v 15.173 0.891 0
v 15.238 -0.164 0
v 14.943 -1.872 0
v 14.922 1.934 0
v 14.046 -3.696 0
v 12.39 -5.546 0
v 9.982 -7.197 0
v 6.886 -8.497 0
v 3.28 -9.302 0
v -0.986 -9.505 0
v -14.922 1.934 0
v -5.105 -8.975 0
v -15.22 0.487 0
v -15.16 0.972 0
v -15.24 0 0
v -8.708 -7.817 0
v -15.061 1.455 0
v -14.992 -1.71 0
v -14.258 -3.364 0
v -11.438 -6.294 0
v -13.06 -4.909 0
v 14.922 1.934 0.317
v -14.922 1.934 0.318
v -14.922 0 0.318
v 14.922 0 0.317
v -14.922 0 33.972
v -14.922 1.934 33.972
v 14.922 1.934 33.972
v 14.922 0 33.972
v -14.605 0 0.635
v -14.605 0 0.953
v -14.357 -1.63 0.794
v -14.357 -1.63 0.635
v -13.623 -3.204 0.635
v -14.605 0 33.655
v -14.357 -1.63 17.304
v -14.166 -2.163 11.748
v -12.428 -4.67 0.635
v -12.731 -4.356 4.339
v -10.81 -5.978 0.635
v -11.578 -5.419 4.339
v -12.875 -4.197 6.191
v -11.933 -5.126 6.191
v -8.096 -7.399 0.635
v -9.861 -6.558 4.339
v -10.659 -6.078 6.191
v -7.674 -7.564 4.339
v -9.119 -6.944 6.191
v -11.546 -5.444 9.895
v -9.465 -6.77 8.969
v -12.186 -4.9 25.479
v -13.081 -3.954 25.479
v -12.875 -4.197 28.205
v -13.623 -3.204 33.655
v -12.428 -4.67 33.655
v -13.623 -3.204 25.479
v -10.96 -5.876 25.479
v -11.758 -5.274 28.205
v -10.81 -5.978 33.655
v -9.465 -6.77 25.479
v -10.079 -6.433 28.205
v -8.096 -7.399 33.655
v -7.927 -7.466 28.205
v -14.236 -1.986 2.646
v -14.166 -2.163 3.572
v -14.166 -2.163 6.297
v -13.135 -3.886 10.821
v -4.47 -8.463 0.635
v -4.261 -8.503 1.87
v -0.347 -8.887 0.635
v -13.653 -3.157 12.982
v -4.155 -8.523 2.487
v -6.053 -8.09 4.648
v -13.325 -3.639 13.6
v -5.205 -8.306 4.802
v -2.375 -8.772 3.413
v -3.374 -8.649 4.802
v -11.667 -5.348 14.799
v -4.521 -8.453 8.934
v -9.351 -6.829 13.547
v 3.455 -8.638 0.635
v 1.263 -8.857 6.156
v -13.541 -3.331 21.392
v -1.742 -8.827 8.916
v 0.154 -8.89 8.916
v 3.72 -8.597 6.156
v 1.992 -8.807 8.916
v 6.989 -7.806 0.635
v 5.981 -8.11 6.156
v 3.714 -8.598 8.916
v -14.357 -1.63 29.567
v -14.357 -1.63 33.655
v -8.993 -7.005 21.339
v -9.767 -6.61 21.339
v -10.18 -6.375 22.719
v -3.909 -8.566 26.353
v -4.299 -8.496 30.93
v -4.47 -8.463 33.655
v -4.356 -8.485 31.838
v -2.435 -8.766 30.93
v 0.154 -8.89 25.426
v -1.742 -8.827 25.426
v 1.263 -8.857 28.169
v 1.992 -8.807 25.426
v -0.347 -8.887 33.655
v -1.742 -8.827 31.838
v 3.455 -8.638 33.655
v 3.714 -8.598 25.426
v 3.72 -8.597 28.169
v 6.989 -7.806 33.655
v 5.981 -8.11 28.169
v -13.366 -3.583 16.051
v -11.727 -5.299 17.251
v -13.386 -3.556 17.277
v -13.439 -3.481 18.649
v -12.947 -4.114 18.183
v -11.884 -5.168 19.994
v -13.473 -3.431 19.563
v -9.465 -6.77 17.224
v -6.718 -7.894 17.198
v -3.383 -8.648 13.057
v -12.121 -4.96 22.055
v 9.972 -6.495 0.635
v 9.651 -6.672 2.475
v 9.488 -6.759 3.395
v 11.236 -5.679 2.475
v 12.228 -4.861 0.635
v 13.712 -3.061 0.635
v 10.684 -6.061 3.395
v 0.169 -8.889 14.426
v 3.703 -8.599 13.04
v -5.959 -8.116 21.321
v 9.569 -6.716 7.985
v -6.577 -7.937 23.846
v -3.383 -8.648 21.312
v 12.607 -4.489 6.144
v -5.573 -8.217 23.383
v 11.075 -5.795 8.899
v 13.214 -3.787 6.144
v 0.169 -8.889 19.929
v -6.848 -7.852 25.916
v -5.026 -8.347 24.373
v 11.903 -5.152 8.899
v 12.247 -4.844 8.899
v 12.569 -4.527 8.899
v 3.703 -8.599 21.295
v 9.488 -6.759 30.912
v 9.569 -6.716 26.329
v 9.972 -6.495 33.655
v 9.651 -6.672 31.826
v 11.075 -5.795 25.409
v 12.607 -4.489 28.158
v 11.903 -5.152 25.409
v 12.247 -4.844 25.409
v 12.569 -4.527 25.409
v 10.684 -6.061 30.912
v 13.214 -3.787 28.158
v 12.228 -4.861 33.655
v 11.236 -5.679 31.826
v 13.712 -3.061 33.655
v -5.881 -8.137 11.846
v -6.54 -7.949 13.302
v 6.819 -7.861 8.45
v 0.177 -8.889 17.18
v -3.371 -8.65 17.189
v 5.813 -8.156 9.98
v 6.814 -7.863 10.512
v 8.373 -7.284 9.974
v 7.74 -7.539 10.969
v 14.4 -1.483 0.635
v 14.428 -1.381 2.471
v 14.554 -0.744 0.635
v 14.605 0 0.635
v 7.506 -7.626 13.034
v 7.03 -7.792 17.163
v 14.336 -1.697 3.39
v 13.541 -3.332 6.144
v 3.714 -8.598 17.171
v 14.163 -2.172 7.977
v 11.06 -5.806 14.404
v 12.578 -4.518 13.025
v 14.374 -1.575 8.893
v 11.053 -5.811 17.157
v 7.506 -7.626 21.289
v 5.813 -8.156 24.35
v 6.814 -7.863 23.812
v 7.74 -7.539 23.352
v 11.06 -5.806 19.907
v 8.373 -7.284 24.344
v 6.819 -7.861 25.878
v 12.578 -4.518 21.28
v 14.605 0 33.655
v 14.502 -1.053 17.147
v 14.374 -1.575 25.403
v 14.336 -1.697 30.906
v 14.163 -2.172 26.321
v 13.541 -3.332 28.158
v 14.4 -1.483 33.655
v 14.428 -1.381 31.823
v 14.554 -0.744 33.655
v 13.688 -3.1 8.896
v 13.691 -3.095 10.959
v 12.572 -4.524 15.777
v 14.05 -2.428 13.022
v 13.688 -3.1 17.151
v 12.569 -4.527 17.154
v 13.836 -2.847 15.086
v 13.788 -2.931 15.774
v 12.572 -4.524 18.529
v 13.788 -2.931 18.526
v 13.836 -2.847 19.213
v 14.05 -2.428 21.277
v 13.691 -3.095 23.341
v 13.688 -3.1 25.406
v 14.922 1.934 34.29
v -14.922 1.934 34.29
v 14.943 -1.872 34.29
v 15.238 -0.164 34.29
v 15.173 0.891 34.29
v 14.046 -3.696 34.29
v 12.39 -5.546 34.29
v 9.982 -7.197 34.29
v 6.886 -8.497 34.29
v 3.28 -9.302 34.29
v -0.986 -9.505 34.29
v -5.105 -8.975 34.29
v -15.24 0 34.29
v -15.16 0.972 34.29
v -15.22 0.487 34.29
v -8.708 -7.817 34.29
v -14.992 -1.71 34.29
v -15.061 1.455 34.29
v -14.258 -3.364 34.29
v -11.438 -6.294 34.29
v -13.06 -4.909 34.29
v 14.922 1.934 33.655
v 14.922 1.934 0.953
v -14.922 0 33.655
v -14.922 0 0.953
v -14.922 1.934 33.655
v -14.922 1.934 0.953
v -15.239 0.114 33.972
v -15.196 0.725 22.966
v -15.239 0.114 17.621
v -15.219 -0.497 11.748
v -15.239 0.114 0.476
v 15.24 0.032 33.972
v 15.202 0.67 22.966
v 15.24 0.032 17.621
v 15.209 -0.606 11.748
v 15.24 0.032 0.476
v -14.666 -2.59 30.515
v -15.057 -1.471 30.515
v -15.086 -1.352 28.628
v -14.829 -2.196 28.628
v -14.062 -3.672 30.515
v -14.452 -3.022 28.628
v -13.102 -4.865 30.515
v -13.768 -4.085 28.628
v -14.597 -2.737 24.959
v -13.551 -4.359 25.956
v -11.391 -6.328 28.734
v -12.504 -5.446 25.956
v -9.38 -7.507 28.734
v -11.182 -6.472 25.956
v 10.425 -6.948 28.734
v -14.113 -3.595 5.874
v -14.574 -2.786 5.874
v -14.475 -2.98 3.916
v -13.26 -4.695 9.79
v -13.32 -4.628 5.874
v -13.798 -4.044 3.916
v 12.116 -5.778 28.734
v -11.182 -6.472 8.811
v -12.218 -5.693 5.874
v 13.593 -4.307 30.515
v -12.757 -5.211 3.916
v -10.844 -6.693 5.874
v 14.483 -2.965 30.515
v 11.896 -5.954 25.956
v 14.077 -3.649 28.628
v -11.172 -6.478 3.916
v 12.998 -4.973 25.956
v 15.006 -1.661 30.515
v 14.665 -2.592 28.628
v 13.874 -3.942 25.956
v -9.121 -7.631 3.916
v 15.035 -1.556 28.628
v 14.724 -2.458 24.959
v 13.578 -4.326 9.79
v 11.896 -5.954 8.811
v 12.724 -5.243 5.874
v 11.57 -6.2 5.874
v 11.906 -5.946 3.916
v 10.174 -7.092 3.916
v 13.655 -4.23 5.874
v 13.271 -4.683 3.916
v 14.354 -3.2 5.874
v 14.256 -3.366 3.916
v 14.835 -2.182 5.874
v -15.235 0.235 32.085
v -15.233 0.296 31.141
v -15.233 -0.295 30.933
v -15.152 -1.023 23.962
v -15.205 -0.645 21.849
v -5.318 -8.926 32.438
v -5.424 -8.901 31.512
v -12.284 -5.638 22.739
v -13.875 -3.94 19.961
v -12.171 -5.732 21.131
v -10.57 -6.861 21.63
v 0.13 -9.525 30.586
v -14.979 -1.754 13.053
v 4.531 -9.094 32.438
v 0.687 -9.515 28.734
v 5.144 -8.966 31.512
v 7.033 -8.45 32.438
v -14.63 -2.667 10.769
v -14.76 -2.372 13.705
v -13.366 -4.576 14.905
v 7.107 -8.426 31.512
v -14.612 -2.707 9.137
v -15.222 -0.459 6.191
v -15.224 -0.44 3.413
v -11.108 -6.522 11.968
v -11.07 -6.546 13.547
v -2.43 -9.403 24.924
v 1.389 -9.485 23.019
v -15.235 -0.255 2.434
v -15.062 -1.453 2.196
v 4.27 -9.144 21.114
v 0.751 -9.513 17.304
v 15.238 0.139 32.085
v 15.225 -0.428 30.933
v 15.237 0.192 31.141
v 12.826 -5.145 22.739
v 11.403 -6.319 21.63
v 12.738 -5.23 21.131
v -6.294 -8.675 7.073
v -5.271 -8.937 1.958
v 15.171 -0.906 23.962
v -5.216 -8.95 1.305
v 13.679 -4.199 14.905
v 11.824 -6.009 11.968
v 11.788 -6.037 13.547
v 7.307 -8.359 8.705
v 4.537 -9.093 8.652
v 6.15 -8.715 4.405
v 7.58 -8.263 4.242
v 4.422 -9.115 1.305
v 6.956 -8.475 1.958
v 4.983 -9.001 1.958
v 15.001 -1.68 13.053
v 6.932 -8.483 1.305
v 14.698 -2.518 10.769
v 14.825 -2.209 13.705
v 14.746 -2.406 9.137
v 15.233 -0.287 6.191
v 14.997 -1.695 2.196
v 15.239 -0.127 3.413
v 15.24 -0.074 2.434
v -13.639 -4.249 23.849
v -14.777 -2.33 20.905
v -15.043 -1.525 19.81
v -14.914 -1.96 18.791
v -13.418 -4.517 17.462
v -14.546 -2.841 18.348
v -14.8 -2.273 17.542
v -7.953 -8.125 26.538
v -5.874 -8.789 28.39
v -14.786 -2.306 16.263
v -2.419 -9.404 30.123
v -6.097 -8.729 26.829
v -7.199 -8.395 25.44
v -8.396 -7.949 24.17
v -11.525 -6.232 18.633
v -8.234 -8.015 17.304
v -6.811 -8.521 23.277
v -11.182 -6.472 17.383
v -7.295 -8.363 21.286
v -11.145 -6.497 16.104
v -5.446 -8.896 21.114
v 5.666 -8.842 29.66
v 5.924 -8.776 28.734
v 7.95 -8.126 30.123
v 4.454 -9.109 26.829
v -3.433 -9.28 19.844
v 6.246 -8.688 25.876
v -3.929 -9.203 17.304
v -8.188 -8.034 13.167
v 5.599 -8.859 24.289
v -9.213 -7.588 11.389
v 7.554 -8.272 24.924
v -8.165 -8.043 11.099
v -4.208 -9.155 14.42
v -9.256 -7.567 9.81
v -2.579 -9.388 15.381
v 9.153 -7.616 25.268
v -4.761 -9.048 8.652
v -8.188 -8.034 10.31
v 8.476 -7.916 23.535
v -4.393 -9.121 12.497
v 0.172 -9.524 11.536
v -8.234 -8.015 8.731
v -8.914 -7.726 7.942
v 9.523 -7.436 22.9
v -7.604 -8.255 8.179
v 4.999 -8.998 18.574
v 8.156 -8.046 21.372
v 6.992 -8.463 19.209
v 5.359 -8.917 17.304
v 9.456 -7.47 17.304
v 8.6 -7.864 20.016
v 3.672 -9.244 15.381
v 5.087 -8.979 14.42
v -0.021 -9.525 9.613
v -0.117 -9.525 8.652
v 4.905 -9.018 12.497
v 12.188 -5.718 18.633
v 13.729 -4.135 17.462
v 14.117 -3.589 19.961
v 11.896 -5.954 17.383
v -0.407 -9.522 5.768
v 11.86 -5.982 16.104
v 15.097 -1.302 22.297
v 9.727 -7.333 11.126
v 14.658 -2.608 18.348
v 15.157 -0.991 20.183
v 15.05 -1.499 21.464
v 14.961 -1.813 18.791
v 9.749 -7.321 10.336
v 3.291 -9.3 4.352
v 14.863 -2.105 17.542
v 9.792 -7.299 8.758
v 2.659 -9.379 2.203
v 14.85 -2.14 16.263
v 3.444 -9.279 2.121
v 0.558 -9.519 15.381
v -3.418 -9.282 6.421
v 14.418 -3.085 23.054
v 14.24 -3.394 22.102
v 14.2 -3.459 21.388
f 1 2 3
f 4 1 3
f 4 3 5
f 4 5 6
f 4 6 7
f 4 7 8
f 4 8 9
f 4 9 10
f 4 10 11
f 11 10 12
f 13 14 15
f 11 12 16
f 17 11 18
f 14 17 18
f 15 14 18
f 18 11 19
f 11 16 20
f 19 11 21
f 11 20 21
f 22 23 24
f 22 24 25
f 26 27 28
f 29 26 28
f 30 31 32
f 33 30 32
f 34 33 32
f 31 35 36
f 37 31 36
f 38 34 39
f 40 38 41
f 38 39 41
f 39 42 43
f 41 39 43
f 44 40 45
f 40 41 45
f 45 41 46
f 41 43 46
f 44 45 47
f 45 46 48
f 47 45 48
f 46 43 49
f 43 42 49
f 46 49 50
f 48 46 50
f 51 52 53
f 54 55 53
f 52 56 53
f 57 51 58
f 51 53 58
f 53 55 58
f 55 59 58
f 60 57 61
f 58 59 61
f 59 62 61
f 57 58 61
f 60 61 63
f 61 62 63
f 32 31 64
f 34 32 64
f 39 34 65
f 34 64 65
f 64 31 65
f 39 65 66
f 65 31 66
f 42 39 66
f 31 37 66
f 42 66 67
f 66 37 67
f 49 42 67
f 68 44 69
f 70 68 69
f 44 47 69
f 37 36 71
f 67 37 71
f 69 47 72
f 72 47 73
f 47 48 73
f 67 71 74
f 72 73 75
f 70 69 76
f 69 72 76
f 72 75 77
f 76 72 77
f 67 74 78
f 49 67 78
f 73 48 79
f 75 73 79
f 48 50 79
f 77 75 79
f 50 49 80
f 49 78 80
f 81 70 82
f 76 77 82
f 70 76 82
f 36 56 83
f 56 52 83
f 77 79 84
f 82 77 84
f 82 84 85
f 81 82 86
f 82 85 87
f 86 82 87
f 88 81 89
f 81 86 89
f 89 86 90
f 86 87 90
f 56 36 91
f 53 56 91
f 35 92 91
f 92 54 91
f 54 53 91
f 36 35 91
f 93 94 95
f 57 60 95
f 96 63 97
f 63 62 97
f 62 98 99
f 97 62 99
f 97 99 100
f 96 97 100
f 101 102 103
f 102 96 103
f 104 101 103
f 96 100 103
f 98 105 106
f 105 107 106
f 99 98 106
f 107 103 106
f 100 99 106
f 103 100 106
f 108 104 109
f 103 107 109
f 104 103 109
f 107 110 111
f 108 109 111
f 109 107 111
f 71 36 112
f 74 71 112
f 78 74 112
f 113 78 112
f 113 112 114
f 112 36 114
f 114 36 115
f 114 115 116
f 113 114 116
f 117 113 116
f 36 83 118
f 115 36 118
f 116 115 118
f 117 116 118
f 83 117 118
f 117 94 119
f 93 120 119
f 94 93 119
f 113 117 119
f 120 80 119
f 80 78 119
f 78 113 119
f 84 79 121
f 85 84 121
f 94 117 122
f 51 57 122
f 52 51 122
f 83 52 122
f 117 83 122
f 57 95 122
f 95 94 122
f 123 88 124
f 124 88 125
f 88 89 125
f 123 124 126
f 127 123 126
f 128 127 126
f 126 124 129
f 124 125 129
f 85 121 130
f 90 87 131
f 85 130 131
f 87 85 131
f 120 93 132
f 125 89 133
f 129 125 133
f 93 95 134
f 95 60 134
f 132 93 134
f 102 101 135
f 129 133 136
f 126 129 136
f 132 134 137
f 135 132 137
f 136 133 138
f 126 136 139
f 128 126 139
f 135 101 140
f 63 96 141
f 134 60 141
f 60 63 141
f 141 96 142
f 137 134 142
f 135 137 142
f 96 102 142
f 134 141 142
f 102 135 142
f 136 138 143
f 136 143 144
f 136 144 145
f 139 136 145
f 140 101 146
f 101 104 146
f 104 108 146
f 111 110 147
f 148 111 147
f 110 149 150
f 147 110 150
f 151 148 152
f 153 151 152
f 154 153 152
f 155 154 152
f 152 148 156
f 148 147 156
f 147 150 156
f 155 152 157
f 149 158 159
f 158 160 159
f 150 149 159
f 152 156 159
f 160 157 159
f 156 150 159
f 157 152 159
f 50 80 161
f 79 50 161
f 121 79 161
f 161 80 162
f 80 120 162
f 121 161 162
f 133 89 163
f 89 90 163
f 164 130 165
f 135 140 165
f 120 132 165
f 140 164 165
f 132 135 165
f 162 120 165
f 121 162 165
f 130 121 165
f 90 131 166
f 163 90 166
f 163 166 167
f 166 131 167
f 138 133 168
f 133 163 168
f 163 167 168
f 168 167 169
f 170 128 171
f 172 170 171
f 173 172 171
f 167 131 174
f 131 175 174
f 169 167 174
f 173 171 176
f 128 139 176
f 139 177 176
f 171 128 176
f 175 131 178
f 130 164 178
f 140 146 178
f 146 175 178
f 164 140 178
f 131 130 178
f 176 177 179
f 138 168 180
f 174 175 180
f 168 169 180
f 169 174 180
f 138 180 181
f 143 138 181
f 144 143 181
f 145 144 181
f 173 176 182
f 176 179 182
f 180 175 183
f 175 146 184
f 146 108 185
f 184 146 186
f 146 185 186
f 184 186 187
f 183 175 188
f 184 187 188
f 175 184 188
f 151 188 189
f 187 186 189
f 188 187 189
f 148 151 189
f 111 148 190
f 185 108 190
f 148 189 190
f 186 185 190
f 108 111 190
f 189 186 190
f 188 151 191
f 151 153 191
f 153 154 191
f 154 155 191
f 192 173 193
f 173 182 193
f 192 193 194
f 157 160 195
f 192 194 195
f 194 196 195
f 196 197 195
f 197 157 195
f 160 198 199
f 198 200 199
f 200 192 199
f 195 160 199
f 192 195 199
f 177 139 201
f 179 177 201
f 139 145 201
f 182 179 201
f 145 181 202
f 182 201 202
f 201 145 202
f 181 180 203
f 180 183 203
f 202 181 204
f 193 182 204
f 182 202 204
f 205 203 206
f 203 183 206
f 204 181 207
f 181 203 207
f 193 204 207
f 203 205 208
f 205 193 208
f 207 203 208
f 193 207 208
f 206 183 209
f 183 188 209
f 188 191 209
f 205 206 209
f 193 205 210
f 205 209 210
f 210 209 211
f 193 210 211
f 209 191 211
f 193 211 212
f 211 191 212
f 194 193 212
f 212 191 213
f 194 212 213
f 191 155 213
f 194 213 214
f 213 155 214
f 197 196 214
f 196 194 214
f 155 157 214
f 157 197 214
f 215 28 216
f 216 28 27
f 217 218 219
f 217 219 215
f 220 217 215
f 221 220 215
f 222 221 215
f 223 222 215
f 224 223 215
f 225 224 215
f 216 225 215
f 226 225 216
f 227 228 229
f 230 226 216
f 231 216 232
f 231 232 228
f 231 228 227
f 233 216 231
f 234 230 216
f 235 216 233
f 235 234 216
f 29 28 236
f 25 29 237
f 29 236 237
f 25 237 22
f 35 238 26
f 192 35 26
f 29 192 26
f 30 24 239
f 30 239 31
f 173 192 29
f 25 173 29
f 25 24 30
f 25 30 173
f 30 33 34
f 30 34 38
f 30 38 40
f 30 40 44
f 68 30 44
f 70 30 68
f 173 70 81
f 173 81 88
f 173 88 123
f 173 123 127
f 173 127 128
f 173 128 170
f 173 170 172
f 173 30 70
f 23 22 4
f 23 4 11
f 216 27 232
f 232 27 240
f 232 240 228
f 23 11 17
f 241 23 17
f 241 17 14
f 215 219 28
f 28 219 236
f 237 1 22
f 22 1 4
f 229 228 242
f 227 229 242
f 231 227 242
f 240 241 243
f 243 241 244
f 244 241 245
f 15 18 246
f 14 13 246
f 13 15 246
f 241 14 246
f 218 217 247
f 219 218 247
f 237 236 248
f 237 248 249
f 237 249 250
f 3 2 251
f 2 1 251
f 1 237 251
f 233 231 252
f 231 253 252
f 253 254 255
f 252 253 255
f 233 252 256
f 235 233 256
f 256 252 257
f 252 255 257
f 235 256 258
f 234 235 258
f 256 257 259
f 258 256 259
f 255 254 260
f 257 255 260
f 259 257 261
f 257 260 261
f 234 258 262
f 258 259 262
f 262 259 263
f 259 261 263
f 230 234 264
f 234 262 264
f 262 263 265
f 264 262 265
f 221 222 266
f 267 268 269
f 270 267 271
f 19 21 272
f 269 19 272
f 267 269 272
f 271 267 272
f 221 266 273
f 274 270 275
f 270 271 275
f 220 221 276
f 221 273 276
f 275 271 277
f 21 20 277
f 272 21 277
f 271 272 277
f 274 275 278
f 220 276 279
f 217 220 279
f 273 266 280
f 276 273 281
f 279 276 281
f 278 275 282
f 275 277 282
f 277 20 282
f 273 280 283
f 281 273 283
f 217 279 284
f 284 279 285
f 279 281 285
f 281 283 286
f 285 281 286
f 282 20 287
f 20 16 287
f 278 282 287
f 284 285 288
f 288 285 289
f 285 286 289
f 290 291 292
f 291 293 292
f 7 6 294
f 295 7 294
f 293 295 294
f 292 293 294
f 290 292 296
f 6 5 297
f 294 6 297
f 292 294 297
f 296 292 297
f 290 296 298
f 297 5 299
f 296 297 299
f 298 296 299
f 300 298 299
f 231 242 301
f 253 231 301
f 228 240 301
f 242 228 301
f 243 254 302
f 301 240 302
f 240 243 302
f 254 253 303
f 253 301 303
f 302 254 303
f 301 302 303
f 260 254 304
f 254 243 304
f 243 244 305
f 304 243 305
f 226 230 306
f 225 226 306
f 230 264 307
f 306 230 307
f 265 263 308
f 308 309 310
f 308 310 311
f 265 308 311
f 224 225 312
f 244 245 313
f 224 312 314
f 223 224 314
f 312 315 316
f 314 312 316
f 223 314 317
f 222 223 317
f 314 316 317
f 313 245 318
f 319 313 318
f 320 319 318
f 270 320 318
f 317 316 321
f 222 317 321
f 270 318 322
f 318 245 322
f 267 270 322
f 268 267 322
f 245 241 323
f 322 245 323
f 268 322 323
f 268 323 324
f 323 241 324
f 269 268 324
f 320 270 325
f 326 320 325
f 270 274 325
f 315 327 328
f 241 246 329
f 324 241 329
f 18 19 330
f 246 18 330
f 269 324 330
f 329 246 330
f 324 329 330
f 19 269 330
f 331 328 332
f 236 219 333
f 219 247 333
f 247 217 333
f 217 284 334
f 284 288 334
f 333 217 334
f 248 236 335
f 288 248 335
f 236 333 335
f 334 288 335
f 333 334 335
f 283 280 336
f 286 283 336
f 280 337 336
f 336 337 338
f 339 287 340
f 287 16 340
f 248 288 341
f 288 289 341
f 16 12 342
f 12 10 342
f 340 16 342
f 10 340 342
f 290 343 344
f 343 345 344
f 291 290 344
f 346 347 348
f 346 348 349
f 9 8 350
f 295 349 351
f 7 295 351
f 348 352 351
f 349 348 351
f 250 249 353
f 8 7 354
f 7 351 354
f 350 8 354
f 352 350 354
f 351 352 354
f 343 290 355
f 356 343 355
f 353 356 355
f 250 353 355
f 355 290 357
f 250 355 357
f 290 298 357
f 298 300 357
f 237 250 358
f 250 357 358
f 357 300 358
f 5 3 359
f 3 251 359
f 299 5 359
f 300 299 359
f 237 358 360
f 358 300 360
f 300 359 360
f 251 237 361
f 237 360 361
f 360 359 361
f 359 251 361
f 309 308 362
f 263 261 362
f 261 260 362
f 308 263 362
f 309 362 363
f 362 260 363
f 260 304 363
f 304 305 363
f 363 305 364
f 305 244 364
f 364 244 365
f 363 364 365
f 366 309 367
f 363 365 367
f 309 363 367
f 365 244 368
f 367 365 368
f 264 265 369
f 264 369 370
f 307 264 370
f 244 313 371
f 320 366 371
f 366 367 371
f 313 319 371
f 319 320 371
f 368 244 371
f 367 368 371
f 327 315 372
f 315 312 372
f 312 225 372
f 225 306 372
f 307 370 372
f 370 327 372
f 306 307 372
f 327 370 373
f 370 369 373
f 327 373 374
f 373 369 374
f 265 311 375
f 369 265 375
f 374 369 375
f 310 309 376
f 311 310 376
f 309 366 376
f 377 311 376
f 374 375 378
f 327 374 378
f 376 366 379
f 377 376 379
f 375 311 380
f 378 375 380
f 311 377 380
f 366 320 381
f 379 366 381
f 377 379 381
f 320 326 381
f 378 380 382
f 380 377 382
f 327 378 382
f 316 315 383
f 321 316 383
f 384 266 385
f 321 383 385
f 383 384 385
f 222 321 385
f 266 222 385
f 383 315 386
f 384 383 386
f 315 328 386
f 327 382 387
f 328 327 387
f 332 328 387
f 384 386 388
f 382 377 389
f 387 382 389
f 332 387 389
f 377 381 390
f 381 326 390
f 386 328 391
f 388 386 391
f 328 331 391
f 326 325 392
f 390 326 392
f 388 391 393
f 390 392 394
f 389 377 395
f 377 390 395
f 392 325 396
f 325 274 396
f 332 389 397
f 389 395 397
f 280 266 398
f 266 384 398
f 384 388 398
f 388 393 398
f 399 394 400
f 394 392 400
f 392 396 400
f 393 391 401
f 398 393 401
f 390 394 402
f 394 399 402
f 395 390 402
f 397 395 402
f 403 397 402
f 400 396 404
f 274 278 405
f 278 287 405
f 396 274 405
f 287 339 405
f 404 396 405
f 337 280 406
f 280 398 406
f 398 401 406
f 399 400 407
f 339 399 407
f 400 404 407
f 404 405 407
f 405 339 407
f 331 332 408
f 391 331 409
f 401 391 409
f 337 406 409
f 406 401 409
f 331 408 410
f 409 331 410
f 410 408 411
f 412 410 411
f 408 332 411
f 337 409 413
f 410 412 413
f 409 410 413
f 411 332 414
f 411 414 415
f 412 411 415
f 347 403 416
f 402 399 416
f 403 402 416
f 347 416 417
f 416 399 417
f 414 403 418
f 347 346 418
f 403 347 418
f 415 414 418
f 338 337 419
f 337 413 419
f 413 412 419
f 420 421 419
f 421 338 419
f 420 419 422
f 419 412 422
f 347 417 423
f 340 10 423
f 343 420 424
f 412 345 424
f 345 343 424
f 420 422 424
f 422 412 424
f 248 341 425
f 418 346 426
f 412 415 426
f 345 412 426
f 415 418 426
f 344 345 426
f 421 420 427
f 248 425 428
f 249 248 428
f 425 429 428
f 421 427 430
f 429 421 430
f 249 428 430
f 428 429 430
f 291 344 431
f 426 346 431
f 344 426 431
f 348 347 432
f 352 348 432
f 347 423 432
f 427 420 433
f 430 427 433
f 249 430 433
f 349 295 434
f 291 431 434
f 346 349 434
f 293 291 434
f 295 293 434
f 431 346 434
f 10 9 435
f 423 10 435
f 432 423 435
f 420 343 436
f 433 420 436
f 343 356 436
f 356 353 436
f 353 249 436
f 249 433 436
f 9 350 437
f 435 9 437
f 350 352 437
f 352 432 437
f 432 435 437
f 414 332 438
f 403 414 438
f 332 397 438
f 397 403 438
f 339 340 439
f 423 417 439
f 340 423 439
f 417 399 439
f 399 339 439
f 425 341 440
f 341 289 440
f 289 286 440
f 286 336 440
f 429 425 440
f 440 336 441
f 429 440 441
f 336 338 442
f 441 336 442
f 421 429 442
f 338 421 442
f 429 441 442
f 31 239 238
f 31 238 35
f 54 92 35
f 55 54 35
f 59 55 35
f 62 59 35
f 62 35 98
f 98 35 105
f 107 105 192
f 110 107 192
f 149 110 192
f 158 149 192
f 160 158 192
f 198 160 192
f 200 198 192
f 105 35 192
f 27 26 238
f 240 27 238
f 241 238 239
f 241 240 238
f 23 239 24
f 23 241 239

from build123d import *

# Parameters (mm, degrees)
SKETCH1_RX              = 15.24
SKETCH1_RY              = 9.525
BOSS_EXTRUDE2_DEPTH     = 34.29
CUT_EXTRUDE1_START      = -0.635
SKETCH3_RX              = 14.605
SKETCH3_RY              = 8.89
CUT_EXTRUDE1_DEPTH      = 33.02
CUT_EXTRUDE3_START      = -0.635
CUT_EXTRUDE3_DEPTH      = 32.7025
SKETCH6_W               = 32.06646649
SKETCH6_H               = 9.119465297
CUT_EXTRUDE4_DEPTH      = 40.3225
CUT_EXTRUDE4_DEPTH_BACK = 32.7025
SKETCH7_W               = 29.517013218
SKETCH7_H               = 33.655
CUT_EXTRUDE5_DEPTH      = 1.93413
SKETCH8_W               = 0.327986782
SKETCH8_H               = 0.3175
CUT_EXTRUDE6_DEPTH      = 1.93413
SKETCH9_W               = 0.327986782
SKETCH9_H               = 0.635
CUT_EXTRUDE7_DEPTH      = 1.93413


with BuildPart() as part:
    # Sketch1 → Boss-Extrude2 (new body)
    with BuildSketch(Plane.XY):
        with Locations(Location((0, 0), (0, 0, 180))):
            Ellipse(SKETCH1_RX, SKETCH1_RY)
    extrude(amount=BOSS_EXTRUDE2_DEPTH)

    # Sketch3 → Cut-Extrude1 (cut)
    with BuildSketch(Plane.XY.offset(34.29).offset(CUT_EXTRUDE1_START)):
        with Locations(Location((0, 0), (0, 0, 4.189e-06))):
            Ellipse(SKETCH3_RX, SKETCH3_RY)
    extrude(amount=-CUT_EXTRUDE1_DEPTH, mode=Mode.SUBTRACT)

    # Sketch4 → Cut-Extrude3 (cut)
    with BuildSketch(Plane.XY.offset(34.29).offset(CUT_EXTRUDE3_START)):
        with BuildLine():
            Line((-14.9225, 0), (0, 0))
            Line((0, 0), (0, 9.525))
            add(Edge.make_bspline(
                [(0, 9.525), (-12.403805408, 9.525), (-14.9225, 1.934129503)],
                knots=[4.71238898, 4.71238898, 4.71238898, 6.078705108, 6.078705108, 6.078705108], degree=2, weights=[1, 0.775583076, 1]))
            Line((-14.9225, 1.934129503), (-14.9225, 0))
        make_face()
        with BuildLine():
            Line((0, 0), (14.9225, 0))
            Line((14.9225, 0), (14.9225, 1.934129503))
            add(Edge.make_bspline(
                [(14.9225, 1.934129503), (12.403805408, 9.525), (0, 9.525)],
                knots=[3.346072853, 3.346072853, 3.346072853, 4.71238898, 4.71238898, 4.71238898], degree=2, weights=[1, 0.775583076, 1]))
            Line((0, 9.525), (0, 0))
        make_face()
    extrude(amount=-CUT_EXTRUDE3_DEPTH, mode=Mode.SUBTRACT)

    # Sketch6 → Cut-Extrude4 (cut, two sides)
    with BuildSketch(Plane(origin=(0, 0, 33.655), x_dir=(-1, 0, 0), z_dir=(0, 0, -1))) as cut_extrude4_sk:
        with Locations((1.110733245, 6.493862152)):
            Rectangle(SKETCH6_W, SKETCH6_H)
    extrude(amount=CUT_EXTRUDE4_DEPTH, mode=Mode.SUBTRACT)
    extrude(cut_extrude4_sk.sketch, amount=-CUT_EXTRUDE4_DEPTH_BACK, mode=Mode.SUBTRACT)

    # Sketch7 → Cut-Extrude5 (cut)
    with BuildSketch(Plane(origin=(0, 1.934129503, 0), x_dir=(1, 0, 0), z_dir=(0, 1, 0))):
        with Locations((0.163993391, -17.145)):
            Rectangle(SKETCH7_W, SKETCH7_H)
    extrude(amount=-CUT_EXTRUDE5_DEPTH, mode=Mode.SUBTRACT)

    # Sketch8 → Cut-Extrude6 (cut)
    with BuildSketch(Plane(origin=(0, 1.934129503, 0), x_dir=(1, 0, 0), z_dir=(0, 1, 0))):
        with Locations((-14.758506609, -33.81375)):
            Rectangle(SKETCH8_W, SKETCH8_H)
    extrude(amount=-CUT_EXTRUDE6_DEPTH, mode=Mode.SUBTRACT)

    # Sketch9 → Cut-Extrude7 (cut)
    with BuildSketch(Plane(origin=(0, 1.934129503, 0), x_dir=(1, 0, 0), z_dir=(0, 1, 0))):
        with Locations((-14.758506609, -0.635)):
            Rectangle(SKETCH9_W, SKETCH9_H)
    extrude(amount=-CUT_EXTRUDE7_DEPTH, mode=Mode.SUBTRACT)


solid = part.part
